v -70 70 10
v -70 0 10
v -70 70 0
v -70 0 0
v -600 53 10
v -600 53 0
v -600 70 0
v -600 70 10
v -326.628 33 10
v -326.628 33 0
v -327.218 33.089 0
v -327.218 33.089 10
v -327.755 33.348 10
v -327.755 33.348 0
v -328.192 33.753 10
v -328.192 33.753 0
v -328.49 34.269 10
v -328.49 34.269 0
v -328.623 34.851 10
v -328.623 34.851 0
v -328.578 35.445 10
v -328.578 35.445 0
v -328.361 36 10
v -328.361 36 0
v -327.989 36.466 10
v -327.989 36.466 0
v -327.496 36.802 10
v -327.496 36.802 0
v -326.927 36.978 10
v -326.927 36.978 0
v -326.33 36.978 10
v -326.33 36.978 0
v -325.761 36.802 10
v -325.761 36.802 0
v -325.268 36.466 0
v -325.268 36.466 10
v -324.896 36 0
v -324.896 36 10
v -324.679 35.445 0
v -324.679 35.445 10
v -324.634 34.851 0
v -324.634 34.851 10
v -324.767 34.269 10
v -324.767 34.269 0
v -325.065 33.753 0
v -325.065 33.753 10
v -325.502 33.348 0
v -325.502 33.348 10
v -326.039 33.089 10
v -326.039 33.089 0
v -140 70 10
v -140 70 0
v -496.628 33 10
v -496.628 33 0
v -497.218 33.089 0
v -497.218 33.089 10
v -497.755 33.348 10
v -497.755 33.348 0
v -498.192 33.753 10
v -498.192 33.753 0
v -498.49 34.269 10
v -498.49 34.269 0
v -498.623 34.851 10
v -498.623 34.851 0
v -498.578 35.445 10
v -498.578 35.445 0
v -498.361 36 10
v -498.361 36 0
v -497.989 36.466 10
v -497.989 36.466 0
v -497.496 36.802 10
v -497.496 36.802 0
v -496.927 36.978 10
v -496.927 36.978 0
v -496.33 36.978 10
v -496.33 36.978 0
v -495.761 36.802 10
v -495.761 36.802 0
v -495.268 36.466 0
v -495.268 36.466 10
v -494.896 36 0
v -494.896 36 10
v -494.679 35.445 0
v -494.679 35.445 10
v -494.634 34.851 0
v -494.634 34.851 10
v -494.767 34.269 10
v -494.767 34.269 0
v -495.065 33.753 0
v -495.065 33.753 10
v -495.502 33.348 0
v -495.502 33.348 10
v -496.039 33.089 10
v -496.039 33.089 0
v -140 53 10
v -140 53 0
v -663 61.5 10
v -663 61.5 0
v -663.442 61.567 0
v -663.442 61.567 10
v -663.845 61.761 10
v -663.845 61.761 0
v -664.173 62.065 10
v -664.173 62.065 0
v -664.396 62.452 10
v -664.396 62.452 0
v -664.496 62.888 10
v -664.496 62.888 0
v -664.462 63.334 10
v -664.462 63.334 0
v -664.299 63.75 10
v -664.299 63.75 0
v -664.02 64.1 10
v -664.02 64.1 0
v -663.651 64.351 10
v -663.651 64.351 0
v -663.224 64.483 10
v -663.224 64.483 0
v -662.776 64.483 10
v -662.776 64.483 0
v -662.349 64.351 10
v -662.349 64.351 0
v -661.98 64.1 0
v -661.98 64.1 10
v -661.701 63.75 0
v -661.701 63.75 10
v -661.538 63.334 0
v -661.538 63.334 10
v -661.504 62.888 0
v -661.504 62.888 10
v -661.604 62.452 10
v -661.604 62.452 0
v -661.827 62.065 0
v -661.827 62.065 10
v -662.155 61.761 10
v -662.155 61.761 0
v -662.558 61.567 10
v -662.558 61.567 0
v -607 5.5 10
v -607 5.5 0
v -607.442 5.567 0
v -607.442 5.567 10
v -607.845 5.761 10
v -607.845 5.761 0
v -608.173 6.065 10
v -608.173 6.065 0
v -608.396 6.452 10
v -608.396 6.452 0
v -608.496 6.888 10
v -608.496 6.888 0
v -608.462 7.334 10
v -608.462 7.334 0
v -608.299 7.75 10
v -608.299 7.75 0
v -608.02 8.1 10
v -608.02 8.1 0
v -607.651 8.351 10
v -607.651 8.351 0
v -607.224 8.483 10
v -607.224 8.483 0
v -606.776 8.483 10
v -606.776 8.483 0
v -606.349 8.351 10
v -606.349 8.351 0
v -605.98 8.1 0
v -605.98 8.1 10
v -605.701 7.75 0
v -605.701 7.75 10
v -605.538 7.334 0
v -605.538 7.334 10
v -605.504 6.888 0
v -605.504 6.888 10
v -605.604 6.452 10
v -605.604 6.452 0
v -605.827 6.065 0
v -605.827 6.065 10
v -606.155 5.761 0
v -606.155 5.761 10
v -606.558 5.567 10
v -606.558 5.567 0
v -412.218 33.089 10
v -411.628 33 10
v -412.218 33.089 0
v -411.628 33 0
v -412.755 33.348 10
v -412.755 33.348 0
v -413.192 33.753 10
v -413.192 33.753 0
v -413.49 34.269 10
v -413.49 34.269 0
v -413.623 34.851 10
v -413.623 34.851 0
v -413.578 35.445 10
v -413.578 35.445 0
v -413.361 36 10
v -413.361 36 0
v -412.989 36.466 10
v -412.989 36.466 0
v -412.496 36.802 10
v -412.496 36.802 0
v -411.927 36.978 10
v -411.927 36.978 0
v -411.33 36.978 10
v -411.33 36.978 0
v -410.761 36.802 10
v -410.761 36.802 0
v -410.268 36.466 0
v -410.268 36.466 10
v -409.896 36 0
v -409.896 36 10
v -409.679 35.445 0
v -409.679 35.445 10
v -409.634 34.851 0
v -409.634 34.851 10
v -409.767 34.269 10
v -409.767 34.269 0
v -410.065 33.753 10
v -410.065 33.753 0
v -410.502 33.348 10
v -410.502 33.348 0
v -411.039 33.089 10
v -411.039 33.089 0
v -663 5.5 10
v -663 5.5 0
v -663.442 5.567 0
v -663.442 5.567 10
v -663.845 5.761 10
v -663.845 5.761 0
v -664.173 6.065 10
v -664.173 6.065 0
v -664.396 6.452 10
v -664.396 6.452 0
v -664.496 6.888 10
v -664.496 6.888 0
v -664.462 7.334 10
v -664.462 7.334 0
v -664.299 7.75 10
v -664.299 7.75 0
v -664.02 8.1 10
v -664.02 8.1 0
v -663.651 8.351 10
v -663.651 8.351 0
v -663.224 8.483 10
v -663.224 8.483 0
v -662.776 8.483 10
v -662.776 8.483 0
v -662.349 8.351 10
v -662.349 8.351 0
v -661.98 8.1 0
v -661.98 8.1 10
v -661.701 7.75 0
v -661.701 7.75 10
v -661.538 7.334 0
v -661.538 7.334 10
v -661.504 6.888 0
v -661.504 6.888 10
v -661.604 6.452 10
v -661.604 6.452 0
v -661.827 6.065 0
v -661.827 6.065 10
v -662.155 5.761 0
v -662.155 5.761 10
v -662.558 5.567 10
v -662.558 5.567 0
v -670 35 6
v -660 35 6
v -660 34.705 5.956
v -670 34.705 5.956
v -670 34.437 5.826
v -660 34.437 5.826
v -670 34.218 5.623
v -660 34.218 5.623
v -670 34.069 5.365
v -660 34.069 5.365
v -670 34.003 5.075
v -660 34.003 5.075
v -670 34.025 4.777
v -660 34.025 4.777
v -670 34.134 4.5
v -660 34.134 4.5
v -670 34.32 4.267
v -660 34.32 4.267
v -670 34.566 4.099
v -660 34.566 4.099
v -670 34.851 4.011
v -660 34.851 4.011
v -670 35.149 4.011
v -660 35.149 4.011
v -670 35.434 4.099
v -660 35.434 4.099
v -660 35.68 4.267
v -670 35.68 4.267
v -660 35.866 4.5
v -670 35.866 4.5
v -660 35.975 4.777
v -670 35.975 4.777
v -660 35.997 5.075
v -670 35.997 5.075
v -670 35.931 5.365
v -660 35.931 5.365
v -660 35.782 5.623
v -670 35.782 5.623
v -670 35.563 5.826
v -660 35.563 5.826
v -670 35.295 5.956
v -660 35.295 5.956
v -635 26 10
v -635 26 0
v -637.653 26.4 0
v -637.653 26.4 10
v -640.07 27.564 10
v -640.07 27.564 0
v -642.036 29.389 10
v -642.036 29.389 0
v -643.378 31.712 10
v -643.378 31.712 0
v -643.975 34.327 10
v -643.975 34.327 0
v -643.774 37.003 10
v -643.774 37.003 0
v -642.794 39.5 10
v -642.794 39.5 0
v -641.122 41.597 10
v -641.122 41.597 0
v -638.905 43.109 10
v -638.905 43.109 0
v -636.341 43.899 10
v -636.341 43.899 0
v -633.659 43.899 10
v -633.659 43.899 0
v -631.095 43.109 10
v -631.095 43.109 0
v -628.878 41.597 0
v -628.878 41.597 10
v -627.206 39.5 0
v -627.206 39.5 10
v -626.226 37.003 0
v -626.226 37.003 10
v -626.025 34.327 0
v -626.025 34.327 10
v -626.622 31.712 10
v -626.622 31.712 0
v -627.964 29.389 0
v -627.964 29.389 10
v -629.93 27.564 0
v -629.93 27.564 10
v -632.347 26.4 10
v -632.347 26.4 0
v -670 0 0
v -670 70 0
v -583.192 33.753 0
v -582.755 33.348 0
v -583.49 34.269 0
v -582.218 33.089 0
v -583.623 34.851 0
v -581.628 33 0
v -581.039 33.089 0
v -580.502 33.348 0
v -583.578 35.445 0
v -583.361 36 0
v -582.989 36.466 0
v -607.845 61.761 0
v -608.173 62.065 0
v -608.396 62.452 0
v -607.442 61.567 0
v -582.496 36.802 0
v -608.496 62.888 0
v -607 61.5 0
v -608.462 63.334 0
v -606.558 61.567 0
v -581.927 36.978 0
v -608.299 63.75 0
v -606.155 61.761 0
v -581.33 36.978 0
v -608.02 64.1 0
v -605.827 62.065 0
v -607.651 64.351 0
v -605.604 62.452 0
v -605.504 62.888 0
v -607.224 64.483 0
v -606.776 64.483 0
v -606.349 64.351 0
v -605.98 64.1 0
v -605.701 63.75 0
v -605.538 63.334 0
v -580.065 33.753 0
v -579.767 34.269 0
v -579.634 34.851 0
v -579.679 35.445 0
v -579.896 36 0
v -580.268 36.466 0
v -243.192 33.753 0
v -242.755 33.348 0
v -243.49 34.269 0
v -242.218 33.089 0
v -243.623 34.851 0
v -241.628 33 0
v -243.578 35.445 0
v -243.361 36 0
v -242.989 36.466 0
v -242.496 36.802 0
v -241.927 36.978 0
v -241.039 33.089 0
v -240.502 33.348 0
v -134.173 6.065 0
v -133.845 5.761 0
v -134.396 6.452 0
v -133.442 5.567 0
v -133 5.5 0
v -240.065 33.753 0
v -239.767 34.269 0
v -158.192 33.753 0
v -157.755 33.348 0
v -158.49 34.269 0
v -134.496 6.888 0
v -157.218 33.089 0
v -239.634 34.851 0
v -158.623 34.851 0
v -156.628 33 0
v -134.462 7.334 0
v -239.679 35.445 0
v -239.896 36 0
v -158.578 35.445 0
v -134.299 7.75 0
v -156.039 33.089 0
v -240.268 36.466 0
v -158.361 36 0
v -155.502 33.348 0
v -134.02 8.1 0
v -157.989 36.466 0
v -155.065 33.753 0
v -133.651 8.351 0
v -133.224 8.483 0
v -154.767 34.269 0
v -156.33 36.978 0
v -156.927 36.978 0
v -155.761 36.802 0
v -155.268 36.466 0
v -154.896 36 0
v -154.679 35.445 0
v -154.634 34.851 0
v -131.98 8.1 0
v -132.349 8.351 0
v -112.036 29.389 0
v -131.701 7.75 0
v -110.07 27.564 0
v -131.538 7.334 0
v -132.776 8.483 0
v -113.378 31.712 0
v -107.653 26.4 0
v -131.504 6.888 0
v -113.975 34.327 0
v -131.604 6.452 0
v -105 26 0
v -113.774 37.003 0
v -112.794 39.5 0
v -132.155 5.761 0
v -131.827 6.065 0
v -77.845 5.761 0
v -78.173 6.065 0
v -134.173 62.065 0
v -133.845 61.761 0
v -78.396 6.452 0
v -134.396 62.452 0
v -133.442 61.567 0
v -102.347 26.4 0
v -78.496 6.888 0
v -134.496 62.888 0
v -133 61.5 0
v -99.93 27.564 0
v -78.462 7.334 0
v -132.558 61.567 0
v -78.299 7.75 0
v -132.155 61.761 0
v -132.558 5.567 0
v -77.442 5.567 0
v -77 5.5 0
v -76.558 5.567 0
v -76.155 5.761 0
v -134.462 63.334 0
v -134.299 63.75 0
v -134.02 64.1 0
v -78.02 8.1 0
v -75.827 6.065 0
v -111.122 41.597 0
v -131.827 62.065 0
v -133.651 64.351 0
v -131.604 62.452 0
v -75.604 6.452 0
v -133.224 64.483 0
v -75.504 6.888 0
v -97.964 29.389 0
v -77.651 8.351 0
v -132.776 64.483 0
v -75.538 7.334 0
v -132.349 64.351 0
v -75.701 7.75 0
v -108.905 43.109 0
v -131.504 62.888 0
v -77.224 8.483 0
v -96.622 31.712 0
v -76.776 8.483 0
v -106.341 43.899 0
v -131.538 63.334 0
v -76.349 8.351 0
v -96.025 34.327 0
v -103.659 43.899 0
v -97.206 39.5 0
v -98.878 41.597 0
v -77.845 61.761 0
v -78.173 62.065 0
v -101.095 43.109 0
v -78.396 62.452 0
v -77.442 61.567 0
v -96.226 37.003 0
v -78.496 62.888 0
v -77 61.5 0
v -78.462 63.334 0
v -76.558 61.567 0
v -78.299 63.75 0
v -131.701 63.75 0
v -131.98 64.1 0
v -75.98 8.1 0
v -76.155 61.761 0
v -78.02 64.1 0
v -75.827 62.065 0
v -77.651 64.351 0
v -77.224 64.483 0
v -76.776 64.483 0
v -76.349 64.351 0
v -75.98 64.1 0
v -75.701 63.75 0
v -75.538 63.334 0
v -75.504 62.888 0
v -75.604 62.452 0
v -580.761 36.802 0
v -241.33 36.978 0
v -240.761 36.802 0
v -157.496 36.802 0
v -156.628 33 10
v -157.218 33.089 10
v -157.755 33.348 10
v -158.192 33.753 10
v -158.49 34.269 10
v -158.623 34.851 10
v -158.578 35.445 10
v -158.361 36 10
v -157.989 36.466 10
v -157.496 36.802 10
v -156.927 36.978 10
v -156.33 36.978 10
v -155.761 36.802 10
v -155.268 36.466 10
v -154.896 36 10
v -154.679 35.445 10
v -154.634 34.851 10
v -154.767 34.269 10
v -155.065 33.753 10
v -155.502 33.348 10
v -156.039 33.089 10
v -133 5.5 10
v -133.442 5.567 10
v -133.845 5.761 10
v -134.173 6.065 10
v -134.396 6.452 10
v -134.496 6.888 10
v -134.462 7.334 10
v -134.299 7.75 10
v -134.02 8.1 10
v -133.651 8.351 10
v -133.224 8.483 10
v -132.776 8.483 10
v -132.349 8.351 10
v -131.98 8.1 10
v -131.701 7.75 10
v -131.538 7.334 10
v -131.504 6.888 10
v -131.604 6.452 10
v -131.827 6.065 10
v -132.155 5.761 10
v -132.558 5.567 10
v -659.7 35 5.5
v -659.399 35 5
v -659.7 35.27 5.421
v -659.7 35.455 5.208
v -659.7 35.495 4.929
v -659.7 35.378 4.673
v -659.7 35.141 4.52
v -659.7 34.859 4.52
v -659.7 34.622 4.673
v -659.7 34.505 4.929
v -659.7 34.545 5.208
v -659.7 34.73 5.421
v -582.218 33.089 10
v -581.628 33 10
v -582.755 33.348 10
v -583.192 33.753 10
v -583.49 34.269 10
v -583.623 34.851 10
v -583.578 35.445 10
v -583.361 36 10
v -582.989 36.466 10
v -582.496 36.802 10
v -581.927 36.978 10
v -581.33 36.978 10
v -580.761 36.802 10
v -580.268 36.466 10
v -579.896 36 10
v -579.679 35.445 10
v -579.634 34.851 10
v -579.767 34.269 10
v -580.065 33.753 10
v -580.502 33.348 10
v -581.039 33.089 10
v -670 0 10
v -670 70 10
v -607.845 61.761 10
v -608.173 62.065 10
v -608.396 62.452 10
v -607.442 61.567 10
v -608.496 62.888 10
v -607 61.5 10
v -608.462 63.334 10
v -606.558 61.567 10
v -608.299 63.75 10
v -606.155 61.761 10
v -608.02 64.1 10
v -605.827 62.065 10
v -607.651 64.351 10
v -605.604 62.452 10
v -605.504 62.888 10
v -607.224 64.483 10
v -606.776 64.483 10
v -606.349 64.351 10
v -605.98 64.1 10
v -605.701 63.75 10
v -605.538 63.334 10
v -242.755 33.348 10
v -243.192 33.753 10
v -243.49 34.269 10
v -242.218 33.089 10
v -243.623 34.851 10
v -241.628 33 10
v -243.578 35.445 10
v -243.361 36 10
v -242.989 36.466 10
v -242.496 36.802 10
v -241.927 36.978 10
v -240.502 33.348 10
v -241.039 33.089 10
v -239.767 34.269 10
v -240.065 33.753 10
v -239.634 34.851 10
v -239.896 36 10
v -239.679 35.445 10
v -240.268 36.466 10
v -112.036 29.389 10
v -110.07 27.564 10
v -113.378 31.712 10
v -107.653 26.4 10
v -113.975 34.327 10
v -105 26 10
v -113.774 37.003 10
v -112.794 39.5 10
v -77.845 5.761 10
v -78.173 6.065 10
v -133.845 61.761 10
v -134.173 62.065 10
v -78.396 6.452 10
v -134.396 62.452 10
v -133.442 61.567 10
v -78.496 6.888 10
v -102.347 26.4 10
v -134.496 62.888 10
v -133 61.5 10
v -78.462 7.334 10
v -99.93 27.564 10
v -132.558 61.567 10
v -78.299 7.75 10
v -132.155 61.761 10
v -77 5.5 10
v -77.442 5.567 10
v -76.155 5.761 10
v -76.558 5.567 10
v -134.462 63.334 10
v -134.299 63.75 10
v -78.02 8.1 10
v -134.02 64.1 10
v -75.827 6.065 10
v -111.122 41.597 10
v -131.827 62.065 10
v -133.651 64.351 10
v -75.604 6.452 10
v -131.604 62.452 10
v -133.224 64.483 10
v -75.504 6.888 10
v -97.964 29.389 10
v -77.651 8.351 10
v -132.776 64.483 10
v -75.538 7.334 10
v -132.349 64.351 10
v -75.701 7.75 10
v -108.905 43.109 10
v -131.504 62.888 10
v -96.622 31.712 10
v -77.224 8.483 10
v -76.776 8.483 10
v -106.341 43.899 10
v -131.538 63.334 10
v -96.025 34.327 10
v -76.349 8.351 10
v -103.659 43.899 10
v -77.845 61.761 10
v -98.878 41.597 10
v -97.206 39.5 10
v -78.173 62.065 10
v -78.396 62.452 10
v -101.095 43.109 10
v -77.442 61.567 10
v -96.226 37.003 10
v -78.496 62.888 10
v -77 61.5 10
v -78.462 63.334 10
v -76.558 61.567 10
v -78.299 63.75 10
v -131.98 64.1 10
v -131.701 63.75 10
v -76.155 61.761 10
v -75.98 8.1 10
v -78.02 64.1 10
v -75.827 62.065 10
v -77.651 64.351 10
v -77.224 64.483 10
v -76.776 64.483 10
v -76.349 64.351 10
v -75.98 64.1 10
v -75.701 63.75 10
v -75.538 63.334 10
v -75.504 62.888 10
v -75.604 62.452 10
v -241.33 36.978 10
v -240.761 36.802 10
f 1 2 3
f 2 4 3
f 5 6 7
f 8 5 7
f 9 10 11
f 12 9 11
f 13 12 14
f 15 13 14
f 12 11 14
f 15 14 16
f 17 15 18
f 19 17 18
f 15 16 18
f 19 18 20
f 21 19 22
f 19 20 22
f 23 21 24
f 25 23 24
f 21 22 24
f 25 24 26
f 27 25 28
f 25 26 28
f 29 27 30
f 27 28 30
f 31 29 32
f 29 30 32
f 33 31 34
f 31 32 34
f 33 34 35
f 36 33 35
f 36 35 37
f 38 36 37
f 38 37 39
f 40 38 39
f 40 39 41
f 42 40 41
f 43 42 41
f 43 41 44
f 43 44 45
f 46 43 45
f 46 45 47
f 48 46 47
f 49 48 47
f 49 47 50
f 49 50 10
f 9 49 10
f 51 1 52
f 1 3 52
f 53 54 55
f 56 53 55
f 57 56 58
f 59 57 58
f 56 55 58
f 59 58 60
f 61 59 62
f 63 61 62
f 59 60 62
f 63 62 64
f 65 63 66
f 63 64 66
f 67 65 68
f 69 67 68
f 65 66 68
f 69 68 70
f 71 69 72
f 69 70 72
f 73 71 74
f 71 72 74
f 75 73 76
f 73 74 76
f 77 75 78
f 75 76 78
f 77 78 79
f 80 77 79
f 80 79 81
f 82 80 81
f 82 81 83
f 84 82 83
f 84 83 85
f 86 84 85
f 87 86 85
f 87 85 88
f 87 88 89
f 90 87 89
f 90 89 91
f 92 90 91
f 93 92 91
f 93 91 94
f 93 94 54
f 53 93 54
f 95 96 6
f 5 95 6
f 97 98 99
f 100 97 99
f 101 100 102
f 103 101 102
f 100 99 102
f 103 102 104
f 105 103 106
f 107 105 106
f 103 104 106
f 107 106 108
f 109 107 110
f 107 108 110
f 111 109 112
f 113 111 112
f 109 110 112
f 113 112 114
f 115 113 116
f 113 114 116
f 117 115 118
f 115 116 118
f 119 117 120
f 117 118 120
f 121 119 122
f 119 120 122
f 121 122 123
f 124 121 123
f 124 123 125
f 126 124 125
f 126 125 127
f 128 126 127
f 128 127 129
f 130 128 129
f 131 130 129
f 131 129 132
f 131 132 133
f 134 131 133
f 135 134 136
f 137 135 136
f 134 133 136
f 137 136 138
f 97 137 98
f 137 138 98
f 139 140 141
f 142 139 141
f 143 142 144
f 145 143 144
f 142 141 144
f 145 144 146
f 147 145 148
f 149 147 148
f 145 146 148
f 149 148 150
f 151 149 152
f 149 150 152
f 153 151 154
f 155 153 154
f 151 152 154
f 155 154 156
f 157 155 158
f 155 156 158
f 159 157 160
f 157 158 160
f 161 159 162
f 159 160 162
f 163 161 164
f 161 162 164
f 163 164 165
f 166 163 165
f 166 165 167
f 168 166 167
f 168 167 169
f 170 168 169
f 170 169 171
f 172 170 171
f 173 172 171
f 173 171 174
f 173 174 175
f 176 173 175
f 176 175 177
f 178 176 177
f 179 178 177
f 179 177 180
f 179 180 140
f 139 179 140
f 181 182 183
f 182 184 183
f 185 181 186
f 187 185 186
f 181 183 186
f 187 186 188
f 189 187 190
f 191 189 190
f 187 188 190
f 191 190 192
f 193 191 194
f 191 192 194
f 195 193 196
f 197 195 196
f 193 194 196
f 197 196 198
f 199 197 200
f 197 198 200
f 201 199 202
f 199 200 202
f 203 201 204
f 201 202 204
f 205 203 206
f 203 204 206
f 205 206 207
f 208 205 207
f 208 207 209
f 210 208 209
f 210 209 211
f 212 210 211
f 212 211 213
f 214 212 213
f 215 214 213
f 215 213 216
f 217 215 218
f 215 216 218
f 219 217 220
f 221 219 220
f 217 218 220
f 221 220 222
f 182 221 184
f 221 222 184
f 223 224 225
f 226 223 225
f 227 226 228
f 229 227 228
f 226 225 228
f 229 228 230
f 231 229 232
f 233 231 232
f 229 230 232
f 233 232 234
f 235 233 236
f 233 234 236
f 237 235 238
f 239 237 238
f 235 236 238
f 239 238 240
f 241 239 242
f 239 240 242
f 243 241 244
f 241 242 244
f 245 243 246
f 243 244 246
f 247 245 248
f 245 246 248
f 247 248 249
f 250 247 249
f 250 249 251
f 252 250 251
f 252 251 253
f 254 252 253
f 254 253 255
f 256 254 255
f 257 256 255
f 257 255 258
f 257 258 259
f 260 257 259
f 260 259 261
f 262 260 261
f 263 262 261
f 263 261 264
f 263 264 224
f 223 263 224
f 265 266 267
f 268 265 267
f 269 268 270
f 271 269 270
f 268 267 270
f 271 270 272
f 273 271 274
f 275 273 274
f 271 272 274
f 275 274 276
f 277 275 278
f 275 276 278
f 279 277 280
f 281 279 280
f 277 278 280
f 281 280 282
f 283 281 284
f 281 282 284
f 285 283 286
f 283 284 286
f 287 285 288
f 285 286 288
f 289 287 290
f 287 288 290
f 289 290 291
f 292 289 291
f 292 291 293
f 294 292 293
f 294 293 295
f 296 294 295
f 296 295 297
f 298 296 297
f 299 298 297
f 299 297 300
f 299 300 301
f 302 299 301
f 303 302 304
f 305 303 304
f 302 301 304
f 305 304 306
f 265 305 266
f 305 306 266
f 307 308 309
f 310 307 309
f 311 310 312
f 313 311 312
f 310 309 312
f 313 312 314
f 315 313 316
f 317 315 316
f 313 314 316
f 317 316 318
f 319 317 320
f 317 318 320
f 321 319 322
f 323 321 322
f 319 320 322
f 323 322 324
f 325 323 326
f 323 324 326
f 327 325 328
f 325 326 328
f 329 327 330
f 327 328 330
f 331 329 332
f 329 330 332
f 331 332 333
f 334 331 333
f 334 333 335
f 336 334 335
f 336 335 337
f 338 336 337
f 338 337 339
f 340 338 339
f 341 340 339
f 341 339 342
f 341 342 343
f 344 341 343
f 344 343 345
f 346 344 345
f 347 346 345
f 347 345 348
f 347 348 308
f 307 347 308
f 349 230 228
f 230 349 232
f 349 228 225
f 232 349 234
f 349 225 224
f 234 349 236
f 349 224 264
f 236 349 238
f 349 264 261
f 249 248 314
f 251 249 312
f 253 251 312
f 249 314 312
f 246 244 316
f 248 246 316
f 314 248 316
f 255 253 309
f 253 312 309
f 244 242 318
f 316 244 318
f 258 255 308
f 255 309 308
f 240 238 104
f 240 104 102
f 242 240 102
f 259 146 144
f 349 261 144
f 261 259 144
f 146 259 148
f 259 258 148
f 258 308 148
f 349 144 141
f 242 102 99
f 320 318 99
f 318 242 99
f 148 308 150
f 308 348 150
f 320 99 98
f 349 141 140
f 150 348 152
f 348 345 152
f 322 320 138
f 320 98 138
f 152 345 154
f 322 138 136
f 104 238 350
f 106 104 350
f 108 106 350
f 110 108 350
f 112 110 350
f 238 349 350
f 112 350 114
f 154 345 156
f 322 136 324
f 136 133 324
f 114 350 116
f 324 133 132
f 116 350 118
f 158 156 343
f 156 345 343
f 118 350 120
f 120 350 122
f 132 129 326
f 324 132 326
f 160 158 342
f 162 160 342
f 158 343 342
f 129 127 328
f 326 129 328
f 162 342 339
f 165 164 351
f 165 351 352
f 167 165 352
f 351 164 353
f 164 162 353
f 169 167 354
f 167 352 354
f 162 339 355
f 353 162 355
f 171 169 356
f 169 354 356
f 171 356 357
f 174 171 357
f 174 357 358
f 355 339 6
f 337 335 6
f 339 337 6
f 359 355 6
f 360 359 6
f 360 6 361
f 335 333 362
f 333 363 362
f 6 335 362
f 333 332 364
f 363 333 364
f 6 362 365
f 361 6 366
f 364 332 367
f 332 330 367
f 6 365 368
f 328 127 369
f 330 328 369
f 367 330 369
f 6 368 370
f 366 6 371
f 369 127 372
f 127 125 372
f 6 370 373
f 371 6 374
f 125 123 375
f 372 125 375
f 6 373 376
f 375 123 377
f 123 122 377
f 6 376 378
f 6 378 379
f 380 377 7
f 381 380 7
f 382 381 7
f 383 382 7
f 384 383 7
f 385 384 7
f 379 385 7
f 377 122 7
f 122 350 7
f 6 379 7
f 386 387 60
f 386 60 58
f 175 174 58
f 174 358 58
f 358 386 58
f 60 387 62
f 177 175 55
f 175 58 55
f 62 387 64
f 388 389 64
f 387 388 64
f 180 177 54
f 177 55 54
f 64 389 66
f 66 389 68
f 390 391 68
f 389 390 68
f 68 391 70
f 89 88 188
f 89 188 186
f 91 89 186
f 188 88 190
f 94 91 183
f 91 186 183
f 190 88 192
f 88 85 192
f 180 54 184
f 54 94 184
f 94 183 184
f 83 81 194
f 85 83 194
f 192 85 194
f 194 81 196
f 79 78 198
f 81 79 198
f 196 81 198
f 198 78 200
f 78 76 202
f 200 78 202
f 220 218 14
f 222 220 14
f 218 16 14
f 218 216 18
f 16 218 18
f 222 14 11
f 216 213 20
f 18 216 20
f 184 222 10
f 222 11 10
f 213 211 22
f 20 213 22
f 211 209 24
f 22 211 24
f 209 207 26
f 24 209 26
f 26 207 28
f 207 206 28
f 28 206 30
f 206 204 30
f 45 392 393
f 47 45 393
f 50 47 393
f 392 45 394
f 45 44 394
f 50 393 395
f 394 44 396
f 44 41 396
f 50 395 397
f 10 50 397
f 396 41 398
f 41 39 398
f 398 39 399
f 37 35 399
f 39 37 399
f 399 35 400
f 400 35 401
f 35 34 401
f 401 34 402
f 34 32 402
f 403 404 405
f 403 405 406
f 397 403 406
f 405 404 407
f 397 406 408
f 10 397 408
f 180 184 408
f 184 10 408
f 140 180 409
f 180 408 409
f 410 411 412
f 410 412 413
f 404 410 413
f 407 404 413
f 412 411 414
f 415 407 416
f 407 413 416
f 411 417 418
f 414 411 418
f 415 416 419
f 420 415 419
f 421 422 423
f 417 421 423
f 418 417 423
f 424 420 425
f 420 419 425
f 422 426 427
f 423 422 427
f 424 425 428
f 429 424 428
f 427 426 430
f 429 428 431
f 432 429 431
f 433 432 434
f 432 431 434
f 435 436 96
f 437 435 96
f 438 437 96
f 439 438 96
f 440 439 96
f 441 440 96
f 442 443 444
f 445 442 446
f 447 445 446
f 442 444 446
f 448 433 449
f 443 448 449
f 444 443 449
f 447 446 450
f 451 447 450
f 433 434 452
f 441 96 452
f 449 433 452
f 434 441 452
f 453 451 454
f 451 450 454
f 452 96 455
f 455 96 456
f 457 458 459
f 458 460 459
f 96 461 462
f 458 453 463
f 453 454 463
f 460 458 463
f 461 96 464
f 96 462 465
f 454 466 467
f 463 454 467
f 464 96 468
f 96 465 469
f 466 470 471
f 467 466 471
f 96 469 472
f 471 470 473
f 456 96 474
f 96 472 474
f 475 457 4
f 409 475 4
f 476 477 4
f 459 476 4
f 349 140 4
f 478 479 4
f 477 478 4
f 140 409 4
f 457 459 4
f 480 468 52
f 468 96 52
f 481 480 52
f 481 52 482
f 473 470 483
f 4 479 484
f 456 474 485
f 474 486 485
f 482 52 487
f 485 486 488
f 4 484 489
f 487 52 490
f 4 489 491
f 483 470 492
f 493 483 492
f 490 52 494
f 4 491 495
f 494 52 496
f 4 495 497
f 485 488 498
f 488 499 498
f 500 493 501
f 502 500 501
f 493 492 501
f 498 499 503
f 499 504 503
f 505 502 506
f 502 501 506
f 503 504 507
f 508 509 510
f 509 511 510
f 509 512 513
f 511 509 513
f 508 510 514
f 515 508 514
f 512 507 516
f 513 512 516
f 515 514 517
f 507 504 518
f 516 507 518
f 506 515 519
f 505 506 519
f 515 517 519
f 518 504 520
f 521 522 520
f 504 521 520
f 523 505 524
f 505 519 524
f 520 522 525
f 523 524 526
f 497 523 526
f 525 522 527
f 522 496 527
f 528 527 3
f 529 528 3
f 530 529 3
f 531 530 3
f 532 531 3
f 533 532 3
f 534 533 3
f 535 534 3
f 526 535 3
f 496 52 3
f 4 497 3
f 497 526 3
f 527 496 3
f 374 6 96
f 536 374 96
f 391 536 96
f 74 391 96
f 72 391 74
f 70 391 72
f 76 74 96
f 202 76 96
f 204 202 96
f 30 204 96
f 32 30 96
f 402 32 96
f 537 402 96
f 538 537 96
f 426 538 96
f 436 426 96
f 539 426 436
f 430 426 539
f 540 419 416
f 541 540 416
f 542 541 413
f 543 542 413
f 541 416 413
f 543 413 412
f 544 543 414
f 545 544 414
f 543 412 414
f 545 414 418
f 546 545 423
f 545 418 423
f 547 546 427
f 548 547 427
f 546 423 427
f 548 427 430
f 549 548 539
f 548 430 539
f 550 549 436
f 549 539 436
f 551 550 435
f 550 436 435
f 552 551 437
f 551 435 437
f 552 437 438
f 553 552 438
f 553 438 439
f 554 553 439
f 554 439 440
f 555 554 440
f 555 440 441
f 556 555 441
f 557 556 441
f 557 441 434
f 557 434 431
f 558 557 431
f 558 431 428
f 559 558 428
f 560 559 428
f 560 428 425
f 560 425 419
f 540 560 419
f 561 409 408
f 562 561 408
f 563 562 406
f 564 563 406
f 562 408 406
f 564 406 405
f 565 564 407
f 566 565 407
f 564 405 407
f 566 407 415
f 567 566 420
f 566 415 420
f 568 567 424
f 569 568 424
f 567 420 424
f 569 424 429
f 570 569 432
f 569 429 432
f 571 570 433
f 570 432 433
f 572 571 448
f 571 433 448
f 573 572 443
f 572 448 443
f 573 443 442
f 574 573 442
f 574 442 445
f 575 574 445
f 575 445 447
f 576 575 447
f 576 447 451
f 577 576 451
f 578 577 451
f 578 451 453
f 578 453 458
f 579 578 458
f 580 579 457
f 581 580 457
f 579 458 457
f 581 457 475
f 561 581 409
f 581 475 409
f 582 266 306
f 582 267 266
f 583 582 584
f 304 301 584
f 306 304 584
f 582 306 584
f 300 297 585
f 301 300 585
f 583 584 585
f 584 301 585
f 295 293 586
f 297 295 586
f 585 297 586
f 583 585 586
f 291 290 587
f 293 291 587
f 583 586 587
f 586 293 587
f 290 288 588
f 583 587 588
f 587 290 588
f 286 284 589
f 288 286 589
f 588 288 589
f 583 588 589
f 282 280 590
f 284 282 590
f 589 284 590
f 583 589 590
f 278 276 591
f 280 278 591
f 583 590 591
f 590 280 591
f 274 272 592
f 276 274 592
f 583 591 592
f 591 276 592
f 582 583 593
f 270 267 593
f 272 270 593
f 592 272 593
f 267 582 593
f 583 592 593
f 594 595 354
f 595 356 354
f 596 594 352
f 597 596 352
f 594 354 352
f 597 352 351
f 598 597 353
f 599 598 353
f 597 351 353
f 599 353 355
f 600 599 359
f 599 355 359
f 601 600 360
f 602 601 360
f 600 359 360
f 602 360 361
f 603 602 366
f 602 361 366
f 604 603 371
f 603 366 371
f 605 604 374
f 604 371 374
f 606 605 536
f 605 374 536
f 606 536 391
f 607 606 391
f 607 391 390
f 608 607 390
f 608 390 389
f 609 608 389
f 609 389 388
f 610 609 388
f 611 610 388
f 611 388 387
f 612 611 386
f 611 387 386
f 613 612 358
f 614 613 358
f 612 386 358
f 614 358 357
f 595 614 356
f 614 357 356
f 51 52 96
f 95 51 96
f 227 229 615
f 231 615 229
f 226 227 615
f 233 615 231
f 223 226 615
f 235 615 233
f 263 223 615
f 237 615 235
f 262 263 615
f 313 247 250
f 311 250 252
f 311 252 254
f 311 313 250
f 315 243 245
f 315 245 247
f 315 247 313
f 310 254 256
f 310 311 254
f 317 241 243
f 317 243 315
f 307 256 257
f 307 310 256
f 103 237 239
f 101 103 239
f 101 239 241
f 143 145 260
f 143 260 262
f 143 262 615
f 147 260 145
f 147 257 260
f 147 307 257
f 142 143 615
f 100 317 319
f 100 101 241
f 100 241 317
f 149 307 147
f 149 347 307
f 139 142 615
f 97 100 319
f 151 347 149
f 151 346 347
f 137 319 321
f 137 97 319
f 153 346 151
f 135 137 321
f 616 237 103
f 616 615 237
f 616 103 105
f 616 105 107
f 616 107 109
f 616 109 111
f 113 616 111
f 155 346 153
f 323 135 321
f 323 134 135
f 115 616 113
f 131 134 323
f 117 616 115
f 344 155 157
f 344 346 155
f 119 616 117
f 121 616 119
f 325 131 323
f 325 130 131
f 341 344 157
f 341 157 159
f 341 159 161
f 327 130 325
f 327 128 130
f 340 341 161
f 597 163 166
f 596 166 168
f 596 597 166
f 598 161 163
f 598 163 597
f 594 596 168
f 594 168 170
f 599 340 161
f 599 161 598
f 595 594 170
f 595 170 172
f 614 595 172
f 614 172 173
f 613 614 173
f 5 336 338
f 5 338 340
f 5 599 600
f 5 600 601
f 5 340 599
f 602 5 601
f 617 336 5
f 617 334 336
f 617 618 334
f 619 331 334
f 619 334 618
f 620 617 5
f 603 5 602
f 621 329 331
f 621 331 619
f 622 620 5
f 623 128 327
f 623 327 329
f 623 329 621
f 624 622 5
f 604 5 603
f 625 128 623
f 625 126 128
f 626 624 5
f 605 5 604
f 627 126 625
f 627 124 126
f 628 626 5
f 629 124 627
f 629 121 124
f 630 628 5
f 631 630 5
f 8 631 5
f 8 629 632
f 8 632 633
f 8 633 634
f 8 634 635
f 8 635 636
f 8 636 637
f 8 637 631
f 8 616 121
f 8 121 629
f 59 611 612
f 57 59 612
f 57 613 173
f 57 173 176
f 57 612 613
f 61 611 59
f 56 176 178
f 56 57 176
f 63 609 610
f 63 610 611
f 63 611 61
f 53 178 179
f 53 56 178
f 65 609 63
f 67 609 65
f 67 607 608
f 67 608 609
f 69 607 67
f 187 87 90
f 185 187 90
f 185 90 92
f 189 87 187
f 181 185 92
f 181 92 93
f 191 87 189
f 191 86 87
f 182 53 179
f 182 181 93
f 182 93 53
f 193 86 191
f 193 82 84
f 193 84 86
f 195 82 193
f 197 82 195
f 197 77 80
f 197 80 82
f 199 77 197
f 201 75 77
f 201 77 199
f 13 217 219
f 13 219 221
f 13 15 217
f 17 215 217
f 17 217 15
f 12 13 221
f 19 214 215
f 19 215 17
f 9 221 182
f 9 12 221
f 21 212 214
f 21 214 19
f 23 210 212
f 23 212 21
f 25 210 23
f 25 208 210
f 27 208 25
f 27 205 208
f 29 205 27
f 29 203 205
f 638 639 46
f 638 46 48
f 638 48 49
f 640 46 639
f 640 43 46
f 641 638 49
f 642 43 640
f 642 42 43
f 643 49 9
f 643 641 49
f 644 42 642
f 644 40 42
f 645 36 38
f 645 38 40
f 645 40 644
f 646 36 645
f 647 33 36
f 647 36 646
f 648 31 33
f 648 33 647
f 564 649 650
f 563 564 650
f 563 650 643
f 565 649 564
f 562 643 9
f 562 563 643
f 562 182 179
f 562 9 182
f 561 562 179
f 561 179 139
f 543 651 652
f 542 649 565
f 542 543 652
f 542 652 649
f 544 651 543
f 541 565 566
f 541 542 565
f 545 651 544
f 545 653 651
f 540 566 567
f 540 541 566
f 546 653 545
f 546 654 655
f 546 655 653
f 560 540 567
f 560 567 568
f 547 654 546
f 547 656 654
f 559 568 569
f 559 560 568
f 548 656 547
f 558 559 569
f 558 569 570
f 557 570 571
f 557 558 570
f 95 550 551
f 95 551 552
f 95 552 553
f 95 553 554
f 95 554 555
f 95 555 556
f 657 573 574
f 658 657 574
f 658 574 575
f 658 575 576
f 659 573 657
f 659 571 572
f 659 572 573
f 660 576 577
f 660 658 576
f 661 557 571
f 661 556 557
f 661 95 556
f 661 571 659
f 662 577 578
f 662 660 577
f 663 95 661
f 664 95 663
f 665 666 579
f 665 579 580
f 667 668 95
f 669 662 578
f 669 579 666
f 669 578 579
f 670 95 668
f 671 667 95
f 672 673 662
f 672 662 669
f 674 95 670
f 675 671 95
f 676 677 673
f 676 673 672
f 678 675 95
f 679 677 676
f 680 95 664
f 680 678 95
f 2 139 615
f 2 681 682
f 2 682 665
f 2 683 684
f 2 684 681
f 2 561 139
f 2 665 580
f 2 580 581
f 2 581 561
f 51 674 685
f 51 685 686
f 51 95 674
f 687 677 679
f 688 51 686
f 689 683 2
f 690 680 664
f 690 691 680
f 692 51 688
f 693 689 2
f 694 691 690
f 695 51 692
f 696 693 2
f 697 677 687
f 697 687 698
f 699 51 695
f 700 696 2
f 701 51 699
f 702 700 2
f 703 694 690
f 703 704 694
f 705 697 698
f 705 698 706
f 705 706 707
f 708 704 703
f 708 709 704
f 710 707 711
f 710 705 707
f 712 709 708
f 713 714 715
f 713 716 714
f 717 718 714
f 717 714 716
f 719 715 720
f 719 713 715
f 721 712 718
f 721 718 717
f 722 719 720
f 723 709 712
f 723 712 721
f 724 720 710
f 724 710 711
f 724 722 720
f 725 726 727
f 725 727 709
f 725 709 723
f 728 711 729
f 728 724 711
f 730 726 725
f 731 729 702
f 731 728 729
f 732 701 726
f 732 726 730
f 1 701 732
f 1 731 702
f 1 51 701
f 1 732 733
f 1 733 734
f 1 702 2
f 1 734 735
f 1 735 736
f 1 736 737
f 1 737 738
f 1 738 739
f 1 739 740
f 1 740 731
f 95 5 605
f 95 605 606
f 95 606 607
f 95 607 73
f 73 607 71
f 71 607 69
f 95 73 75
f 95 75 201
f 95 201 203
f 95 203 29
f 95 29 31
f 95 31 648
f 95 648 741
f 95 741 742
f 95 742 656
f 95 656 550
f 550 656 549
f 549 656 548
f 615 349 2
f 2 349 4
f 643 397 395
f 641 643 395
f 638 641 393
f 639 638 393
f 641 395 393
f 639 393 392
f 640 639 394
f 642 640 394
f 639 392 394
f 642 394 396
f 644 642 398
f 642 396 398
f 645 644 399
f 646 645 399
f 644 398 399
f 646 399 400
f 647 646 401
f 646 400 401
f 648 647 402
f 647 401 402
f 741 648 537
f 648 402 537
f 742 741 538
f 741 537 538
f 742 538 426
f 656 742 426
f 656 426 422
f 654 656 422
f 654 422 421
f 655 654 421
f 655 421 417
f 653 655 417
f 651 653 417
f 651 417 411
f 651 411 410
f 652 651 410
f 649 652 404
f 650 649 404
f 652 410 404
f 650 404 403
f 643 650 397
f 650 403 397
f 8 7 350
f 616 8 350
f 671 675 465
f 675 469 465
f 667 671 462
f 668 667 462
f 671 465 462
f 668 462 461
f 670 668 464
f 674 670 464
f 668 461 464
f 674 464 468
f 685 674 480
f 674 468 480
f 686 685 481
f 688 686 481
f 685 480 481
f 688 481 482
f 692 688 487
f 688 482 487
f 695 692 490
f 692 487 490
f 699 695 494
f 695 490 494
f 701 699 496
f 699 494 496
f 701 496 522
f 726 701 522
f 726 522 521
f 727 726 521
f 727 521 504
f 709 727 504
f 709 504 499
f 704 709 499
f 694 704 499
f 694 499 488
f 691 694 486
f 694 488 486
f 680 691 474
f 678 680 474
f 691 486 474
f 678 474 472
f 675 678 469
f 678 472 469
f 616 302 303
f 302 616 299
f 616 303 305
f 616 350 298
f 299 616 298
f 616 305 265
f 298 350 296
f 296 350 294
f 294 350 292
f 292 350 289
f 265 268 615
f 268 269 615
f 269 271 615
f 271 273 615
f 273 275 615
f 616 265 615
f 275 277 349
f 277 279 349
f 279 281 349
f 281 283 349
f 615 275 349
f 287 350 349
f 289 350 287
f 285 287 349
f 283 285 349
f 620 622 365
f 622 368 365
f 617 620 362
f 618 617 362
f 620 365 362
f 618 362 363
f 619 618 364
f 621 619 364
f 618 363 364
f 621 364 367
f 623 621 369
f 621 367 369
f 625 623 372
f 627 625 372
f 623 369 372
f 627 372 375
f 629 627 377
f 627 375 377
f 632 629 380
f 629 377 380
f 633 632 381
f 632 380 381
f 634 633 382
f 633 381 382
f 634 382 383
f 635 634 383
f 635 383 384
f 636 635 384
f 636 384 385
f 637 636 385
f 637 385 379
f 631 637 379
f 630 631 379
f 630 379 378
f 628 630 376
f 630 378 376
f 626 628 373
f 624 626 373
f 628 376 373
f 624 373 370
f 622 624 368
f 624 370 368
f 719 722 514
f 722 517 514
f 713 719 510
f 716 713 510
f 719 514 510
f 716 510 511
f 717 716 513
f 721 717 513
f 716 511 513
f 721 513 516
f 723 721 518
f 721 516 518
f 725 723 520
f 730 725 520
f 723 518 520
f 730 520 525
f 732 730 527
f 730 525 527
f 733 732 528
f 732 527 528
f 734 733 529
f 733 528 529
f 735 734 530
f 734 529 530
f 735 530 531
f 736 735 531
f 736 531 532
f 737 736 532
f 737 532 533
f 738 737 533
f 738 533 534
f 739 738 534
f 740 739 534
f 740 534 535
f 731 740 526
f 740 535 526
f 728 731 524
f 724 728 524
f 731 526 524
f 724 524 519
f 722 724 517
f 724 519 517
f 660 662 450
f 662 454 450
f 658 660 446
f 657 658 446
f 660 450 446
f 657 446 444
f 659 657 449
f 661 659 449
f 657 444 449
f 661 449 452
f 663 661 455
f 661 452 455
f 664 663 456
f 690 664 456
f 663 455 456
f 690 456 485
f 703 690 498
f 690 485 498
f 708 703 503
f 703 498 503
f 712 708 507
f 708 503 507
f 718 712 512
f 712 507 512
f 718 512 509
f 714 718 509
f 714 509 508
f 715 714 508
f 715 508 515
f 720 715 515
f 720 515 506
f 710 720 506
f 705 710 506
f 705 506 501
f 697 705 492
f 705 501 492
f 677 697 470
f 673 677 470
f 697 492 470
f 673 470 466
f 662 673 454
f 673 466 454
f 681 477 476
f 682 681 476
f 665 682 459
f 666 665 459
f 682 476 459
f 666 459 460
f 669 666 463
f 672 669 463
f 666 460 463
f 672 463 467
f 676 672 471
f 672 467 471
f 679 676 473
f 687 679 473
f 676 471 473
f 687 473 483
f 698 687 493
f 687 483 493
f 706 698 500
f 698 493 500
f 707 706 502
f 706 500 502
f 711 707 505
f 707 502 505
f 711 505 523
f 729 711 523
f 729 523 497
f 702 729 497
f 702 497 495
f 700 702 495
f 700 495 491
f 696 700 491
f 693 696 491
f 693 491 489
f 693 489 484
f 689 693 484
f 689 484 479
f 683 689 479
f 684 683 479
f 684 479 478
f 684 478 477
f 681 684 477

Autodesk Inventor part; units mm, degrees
ref_plane "YZ Plane" through (0, 0, 0) normal (1, 0, 0) x (0, 1, 0)
ref_plane "XZ Plane" through (0, 0, 0) normal (0, 1, 0) x (-1, 0, 0)
ref_plane "XY Plane" through (0, 0, 0) normal (0, 0, 1) x (1, 0, 0)
sketch "Sketch1" plane through (0, 0, 0) normal (0, 0, 1) x (1, 0, 0)
  line L0 (-70, 0) -> (-70, 70)
  line L1 (-70, 70) -> (-140, 70)
  line L2 (-140, 70) -> (-140, 53)
  line L3 (-140, 53) -> (-600, 53)
  line L4 (-600, 53) -> (-600, 70)
  line L5 (-600, 70) -> (-670, 70)
  line L6 (-670, 70) -> (-670, 0)
  line L7 (-670, 0) -> (-70, 0)
  point P0 (0, 0)
extrude "Extrusion1" add sketch "Sketch1" along normal blind 10
sketch "Sketch2" plane through (0, 0, 10) normal (0, 0, 1) x (1, 0, 0)
  line L0 (-70, 70) -> (-140, 70) projected
  line L1 (-70, 0) -> (-70, 70) projected
  line L2 (-600, 70) -> (-670, 70) projected
  line L3 (-670, 70) -> (-670, 0) projected
  point P0 (0, 0)
  point P1 (-105, 35)
  point P2 (-635, 35)
  dimension "d7" = 35
  dimension "d8" = 35
  dimension "d9" = 35
  dimension "d10" = 35
hole "Hole1" at (-105, 35, 10) at (-635, 35, 10) direction (0, 0, -1) diameter 18 end through all
sketch "Sketch3" plane through (0, 0, 10) normal (0, 0, 1) x (1, 0, 0)
  line L0 (-70, 70) -> (-140, 70) projected
  line L1 (-70, 0) -> (-70, 70) projected
  line L2 (-670, 0) -> (-70, 0) projected
  line L3 (-140, 70) -> (-140, 53) projected
  point P0 (0, 0)
  point P1 (-77, 63)
  point P2 (-77, 7)
  point P3 (-133, 63)
  point P4 (7, -7)
  dimension "d18" = 7
  dimension "d19" = 7
  dimension "d20" = 7
  dimension "d21" = 7
  dimension "d22" = 7
  dimension "d23" = 7
  dimension "d24" = 7
hole "Hole2" at (-77, 63, 10) at (-77, 7, 10) at (-133, 63, 10) at (7, -7, 10) direction (0, 0, -1) diameter 3 end through all
sketch "Sketch4" plane through (0, 0, 10) normal (0, 0, 1) x (1, 0, 0)
  line L0 (-670, 0) -> (-70, 0) projected
  line L1 (-70, 0) -> (-70, 70) projected
  point P0 (0, 0)
  point P1 (-133, 7)
  dimension "d32" = 7
  dimension "d33" = 63
hole "Hole3" at (-133, 7, 10) direction (0, 0, -1) diameter 3 end through all
sketch "Sketch5" plane through (0, 0, 10) normal (0, 0, 1) x (1, 0, 0)
  line L0 (-600, 70) -> (-670, 70) projected
  line L1 (-670, 70) -> (-670, 0) projected
  line L2 (-670, 0) -> (-70, 0) projected
  line L3 (-600, 53) -> (-600, 70) projected
  point P0 (0, 0)
  point P1 (-663, 63)
  point P2 (-663, 7)
  point P3 (-607, 63)
  point P4 (-607, 7)
  dimension "d41" = 7
  dimension "d42" = 7
  dimension "d43" = 7
  dimension "d44" = 7
  dimension "d45" = 7
  dimension "d46" = 7
  dimension "d47" = 7
  dimension "d48" = 63
hole "Hole4" at (-663, 63, 10) at (-663, 7, 10) at (-607, 63, 10) at (-607, 7, 10) direction (0, 0, -1) diameter 3 end through all
sketch "Sketch6" plane through (0, 0, 10) normal (0, 0, 1) x (1, 0, 0)
  line L0 (-140, 53) -> (-600, 53) projected
  point P0 (0, 0)
  point P1 (-581.6285, 35)
  point P2 (-142, 53)
  point P3 (-598, 53)
  dimension "d63" = 18
hole "Hole5" at (-581.6285, 35, 10) direction (0, 0, -1) diameter 4 end through all
pattern_linear "Rectangular Pattern1" count 6 spacing 85 along (1, 0, 0) of "Hole5"
sketch "Sketch10" plane through (-670, 0, 0) normal (-1, 0, 0) x (0, 0, 1)
  line L0 (10, 70) -> (10, 0) projected
  line L1 (0, 0) -> (10, 0) projected
  point P0 (5, 35)
  dimension "d100" = 5
  dimension "d101" = 35
hole "Hole9" at (-670, 35, 5) direction (1, 0, 0) diameter 2 depth 10 tip angle 118
properties part number "conveyor belt sideplank"
